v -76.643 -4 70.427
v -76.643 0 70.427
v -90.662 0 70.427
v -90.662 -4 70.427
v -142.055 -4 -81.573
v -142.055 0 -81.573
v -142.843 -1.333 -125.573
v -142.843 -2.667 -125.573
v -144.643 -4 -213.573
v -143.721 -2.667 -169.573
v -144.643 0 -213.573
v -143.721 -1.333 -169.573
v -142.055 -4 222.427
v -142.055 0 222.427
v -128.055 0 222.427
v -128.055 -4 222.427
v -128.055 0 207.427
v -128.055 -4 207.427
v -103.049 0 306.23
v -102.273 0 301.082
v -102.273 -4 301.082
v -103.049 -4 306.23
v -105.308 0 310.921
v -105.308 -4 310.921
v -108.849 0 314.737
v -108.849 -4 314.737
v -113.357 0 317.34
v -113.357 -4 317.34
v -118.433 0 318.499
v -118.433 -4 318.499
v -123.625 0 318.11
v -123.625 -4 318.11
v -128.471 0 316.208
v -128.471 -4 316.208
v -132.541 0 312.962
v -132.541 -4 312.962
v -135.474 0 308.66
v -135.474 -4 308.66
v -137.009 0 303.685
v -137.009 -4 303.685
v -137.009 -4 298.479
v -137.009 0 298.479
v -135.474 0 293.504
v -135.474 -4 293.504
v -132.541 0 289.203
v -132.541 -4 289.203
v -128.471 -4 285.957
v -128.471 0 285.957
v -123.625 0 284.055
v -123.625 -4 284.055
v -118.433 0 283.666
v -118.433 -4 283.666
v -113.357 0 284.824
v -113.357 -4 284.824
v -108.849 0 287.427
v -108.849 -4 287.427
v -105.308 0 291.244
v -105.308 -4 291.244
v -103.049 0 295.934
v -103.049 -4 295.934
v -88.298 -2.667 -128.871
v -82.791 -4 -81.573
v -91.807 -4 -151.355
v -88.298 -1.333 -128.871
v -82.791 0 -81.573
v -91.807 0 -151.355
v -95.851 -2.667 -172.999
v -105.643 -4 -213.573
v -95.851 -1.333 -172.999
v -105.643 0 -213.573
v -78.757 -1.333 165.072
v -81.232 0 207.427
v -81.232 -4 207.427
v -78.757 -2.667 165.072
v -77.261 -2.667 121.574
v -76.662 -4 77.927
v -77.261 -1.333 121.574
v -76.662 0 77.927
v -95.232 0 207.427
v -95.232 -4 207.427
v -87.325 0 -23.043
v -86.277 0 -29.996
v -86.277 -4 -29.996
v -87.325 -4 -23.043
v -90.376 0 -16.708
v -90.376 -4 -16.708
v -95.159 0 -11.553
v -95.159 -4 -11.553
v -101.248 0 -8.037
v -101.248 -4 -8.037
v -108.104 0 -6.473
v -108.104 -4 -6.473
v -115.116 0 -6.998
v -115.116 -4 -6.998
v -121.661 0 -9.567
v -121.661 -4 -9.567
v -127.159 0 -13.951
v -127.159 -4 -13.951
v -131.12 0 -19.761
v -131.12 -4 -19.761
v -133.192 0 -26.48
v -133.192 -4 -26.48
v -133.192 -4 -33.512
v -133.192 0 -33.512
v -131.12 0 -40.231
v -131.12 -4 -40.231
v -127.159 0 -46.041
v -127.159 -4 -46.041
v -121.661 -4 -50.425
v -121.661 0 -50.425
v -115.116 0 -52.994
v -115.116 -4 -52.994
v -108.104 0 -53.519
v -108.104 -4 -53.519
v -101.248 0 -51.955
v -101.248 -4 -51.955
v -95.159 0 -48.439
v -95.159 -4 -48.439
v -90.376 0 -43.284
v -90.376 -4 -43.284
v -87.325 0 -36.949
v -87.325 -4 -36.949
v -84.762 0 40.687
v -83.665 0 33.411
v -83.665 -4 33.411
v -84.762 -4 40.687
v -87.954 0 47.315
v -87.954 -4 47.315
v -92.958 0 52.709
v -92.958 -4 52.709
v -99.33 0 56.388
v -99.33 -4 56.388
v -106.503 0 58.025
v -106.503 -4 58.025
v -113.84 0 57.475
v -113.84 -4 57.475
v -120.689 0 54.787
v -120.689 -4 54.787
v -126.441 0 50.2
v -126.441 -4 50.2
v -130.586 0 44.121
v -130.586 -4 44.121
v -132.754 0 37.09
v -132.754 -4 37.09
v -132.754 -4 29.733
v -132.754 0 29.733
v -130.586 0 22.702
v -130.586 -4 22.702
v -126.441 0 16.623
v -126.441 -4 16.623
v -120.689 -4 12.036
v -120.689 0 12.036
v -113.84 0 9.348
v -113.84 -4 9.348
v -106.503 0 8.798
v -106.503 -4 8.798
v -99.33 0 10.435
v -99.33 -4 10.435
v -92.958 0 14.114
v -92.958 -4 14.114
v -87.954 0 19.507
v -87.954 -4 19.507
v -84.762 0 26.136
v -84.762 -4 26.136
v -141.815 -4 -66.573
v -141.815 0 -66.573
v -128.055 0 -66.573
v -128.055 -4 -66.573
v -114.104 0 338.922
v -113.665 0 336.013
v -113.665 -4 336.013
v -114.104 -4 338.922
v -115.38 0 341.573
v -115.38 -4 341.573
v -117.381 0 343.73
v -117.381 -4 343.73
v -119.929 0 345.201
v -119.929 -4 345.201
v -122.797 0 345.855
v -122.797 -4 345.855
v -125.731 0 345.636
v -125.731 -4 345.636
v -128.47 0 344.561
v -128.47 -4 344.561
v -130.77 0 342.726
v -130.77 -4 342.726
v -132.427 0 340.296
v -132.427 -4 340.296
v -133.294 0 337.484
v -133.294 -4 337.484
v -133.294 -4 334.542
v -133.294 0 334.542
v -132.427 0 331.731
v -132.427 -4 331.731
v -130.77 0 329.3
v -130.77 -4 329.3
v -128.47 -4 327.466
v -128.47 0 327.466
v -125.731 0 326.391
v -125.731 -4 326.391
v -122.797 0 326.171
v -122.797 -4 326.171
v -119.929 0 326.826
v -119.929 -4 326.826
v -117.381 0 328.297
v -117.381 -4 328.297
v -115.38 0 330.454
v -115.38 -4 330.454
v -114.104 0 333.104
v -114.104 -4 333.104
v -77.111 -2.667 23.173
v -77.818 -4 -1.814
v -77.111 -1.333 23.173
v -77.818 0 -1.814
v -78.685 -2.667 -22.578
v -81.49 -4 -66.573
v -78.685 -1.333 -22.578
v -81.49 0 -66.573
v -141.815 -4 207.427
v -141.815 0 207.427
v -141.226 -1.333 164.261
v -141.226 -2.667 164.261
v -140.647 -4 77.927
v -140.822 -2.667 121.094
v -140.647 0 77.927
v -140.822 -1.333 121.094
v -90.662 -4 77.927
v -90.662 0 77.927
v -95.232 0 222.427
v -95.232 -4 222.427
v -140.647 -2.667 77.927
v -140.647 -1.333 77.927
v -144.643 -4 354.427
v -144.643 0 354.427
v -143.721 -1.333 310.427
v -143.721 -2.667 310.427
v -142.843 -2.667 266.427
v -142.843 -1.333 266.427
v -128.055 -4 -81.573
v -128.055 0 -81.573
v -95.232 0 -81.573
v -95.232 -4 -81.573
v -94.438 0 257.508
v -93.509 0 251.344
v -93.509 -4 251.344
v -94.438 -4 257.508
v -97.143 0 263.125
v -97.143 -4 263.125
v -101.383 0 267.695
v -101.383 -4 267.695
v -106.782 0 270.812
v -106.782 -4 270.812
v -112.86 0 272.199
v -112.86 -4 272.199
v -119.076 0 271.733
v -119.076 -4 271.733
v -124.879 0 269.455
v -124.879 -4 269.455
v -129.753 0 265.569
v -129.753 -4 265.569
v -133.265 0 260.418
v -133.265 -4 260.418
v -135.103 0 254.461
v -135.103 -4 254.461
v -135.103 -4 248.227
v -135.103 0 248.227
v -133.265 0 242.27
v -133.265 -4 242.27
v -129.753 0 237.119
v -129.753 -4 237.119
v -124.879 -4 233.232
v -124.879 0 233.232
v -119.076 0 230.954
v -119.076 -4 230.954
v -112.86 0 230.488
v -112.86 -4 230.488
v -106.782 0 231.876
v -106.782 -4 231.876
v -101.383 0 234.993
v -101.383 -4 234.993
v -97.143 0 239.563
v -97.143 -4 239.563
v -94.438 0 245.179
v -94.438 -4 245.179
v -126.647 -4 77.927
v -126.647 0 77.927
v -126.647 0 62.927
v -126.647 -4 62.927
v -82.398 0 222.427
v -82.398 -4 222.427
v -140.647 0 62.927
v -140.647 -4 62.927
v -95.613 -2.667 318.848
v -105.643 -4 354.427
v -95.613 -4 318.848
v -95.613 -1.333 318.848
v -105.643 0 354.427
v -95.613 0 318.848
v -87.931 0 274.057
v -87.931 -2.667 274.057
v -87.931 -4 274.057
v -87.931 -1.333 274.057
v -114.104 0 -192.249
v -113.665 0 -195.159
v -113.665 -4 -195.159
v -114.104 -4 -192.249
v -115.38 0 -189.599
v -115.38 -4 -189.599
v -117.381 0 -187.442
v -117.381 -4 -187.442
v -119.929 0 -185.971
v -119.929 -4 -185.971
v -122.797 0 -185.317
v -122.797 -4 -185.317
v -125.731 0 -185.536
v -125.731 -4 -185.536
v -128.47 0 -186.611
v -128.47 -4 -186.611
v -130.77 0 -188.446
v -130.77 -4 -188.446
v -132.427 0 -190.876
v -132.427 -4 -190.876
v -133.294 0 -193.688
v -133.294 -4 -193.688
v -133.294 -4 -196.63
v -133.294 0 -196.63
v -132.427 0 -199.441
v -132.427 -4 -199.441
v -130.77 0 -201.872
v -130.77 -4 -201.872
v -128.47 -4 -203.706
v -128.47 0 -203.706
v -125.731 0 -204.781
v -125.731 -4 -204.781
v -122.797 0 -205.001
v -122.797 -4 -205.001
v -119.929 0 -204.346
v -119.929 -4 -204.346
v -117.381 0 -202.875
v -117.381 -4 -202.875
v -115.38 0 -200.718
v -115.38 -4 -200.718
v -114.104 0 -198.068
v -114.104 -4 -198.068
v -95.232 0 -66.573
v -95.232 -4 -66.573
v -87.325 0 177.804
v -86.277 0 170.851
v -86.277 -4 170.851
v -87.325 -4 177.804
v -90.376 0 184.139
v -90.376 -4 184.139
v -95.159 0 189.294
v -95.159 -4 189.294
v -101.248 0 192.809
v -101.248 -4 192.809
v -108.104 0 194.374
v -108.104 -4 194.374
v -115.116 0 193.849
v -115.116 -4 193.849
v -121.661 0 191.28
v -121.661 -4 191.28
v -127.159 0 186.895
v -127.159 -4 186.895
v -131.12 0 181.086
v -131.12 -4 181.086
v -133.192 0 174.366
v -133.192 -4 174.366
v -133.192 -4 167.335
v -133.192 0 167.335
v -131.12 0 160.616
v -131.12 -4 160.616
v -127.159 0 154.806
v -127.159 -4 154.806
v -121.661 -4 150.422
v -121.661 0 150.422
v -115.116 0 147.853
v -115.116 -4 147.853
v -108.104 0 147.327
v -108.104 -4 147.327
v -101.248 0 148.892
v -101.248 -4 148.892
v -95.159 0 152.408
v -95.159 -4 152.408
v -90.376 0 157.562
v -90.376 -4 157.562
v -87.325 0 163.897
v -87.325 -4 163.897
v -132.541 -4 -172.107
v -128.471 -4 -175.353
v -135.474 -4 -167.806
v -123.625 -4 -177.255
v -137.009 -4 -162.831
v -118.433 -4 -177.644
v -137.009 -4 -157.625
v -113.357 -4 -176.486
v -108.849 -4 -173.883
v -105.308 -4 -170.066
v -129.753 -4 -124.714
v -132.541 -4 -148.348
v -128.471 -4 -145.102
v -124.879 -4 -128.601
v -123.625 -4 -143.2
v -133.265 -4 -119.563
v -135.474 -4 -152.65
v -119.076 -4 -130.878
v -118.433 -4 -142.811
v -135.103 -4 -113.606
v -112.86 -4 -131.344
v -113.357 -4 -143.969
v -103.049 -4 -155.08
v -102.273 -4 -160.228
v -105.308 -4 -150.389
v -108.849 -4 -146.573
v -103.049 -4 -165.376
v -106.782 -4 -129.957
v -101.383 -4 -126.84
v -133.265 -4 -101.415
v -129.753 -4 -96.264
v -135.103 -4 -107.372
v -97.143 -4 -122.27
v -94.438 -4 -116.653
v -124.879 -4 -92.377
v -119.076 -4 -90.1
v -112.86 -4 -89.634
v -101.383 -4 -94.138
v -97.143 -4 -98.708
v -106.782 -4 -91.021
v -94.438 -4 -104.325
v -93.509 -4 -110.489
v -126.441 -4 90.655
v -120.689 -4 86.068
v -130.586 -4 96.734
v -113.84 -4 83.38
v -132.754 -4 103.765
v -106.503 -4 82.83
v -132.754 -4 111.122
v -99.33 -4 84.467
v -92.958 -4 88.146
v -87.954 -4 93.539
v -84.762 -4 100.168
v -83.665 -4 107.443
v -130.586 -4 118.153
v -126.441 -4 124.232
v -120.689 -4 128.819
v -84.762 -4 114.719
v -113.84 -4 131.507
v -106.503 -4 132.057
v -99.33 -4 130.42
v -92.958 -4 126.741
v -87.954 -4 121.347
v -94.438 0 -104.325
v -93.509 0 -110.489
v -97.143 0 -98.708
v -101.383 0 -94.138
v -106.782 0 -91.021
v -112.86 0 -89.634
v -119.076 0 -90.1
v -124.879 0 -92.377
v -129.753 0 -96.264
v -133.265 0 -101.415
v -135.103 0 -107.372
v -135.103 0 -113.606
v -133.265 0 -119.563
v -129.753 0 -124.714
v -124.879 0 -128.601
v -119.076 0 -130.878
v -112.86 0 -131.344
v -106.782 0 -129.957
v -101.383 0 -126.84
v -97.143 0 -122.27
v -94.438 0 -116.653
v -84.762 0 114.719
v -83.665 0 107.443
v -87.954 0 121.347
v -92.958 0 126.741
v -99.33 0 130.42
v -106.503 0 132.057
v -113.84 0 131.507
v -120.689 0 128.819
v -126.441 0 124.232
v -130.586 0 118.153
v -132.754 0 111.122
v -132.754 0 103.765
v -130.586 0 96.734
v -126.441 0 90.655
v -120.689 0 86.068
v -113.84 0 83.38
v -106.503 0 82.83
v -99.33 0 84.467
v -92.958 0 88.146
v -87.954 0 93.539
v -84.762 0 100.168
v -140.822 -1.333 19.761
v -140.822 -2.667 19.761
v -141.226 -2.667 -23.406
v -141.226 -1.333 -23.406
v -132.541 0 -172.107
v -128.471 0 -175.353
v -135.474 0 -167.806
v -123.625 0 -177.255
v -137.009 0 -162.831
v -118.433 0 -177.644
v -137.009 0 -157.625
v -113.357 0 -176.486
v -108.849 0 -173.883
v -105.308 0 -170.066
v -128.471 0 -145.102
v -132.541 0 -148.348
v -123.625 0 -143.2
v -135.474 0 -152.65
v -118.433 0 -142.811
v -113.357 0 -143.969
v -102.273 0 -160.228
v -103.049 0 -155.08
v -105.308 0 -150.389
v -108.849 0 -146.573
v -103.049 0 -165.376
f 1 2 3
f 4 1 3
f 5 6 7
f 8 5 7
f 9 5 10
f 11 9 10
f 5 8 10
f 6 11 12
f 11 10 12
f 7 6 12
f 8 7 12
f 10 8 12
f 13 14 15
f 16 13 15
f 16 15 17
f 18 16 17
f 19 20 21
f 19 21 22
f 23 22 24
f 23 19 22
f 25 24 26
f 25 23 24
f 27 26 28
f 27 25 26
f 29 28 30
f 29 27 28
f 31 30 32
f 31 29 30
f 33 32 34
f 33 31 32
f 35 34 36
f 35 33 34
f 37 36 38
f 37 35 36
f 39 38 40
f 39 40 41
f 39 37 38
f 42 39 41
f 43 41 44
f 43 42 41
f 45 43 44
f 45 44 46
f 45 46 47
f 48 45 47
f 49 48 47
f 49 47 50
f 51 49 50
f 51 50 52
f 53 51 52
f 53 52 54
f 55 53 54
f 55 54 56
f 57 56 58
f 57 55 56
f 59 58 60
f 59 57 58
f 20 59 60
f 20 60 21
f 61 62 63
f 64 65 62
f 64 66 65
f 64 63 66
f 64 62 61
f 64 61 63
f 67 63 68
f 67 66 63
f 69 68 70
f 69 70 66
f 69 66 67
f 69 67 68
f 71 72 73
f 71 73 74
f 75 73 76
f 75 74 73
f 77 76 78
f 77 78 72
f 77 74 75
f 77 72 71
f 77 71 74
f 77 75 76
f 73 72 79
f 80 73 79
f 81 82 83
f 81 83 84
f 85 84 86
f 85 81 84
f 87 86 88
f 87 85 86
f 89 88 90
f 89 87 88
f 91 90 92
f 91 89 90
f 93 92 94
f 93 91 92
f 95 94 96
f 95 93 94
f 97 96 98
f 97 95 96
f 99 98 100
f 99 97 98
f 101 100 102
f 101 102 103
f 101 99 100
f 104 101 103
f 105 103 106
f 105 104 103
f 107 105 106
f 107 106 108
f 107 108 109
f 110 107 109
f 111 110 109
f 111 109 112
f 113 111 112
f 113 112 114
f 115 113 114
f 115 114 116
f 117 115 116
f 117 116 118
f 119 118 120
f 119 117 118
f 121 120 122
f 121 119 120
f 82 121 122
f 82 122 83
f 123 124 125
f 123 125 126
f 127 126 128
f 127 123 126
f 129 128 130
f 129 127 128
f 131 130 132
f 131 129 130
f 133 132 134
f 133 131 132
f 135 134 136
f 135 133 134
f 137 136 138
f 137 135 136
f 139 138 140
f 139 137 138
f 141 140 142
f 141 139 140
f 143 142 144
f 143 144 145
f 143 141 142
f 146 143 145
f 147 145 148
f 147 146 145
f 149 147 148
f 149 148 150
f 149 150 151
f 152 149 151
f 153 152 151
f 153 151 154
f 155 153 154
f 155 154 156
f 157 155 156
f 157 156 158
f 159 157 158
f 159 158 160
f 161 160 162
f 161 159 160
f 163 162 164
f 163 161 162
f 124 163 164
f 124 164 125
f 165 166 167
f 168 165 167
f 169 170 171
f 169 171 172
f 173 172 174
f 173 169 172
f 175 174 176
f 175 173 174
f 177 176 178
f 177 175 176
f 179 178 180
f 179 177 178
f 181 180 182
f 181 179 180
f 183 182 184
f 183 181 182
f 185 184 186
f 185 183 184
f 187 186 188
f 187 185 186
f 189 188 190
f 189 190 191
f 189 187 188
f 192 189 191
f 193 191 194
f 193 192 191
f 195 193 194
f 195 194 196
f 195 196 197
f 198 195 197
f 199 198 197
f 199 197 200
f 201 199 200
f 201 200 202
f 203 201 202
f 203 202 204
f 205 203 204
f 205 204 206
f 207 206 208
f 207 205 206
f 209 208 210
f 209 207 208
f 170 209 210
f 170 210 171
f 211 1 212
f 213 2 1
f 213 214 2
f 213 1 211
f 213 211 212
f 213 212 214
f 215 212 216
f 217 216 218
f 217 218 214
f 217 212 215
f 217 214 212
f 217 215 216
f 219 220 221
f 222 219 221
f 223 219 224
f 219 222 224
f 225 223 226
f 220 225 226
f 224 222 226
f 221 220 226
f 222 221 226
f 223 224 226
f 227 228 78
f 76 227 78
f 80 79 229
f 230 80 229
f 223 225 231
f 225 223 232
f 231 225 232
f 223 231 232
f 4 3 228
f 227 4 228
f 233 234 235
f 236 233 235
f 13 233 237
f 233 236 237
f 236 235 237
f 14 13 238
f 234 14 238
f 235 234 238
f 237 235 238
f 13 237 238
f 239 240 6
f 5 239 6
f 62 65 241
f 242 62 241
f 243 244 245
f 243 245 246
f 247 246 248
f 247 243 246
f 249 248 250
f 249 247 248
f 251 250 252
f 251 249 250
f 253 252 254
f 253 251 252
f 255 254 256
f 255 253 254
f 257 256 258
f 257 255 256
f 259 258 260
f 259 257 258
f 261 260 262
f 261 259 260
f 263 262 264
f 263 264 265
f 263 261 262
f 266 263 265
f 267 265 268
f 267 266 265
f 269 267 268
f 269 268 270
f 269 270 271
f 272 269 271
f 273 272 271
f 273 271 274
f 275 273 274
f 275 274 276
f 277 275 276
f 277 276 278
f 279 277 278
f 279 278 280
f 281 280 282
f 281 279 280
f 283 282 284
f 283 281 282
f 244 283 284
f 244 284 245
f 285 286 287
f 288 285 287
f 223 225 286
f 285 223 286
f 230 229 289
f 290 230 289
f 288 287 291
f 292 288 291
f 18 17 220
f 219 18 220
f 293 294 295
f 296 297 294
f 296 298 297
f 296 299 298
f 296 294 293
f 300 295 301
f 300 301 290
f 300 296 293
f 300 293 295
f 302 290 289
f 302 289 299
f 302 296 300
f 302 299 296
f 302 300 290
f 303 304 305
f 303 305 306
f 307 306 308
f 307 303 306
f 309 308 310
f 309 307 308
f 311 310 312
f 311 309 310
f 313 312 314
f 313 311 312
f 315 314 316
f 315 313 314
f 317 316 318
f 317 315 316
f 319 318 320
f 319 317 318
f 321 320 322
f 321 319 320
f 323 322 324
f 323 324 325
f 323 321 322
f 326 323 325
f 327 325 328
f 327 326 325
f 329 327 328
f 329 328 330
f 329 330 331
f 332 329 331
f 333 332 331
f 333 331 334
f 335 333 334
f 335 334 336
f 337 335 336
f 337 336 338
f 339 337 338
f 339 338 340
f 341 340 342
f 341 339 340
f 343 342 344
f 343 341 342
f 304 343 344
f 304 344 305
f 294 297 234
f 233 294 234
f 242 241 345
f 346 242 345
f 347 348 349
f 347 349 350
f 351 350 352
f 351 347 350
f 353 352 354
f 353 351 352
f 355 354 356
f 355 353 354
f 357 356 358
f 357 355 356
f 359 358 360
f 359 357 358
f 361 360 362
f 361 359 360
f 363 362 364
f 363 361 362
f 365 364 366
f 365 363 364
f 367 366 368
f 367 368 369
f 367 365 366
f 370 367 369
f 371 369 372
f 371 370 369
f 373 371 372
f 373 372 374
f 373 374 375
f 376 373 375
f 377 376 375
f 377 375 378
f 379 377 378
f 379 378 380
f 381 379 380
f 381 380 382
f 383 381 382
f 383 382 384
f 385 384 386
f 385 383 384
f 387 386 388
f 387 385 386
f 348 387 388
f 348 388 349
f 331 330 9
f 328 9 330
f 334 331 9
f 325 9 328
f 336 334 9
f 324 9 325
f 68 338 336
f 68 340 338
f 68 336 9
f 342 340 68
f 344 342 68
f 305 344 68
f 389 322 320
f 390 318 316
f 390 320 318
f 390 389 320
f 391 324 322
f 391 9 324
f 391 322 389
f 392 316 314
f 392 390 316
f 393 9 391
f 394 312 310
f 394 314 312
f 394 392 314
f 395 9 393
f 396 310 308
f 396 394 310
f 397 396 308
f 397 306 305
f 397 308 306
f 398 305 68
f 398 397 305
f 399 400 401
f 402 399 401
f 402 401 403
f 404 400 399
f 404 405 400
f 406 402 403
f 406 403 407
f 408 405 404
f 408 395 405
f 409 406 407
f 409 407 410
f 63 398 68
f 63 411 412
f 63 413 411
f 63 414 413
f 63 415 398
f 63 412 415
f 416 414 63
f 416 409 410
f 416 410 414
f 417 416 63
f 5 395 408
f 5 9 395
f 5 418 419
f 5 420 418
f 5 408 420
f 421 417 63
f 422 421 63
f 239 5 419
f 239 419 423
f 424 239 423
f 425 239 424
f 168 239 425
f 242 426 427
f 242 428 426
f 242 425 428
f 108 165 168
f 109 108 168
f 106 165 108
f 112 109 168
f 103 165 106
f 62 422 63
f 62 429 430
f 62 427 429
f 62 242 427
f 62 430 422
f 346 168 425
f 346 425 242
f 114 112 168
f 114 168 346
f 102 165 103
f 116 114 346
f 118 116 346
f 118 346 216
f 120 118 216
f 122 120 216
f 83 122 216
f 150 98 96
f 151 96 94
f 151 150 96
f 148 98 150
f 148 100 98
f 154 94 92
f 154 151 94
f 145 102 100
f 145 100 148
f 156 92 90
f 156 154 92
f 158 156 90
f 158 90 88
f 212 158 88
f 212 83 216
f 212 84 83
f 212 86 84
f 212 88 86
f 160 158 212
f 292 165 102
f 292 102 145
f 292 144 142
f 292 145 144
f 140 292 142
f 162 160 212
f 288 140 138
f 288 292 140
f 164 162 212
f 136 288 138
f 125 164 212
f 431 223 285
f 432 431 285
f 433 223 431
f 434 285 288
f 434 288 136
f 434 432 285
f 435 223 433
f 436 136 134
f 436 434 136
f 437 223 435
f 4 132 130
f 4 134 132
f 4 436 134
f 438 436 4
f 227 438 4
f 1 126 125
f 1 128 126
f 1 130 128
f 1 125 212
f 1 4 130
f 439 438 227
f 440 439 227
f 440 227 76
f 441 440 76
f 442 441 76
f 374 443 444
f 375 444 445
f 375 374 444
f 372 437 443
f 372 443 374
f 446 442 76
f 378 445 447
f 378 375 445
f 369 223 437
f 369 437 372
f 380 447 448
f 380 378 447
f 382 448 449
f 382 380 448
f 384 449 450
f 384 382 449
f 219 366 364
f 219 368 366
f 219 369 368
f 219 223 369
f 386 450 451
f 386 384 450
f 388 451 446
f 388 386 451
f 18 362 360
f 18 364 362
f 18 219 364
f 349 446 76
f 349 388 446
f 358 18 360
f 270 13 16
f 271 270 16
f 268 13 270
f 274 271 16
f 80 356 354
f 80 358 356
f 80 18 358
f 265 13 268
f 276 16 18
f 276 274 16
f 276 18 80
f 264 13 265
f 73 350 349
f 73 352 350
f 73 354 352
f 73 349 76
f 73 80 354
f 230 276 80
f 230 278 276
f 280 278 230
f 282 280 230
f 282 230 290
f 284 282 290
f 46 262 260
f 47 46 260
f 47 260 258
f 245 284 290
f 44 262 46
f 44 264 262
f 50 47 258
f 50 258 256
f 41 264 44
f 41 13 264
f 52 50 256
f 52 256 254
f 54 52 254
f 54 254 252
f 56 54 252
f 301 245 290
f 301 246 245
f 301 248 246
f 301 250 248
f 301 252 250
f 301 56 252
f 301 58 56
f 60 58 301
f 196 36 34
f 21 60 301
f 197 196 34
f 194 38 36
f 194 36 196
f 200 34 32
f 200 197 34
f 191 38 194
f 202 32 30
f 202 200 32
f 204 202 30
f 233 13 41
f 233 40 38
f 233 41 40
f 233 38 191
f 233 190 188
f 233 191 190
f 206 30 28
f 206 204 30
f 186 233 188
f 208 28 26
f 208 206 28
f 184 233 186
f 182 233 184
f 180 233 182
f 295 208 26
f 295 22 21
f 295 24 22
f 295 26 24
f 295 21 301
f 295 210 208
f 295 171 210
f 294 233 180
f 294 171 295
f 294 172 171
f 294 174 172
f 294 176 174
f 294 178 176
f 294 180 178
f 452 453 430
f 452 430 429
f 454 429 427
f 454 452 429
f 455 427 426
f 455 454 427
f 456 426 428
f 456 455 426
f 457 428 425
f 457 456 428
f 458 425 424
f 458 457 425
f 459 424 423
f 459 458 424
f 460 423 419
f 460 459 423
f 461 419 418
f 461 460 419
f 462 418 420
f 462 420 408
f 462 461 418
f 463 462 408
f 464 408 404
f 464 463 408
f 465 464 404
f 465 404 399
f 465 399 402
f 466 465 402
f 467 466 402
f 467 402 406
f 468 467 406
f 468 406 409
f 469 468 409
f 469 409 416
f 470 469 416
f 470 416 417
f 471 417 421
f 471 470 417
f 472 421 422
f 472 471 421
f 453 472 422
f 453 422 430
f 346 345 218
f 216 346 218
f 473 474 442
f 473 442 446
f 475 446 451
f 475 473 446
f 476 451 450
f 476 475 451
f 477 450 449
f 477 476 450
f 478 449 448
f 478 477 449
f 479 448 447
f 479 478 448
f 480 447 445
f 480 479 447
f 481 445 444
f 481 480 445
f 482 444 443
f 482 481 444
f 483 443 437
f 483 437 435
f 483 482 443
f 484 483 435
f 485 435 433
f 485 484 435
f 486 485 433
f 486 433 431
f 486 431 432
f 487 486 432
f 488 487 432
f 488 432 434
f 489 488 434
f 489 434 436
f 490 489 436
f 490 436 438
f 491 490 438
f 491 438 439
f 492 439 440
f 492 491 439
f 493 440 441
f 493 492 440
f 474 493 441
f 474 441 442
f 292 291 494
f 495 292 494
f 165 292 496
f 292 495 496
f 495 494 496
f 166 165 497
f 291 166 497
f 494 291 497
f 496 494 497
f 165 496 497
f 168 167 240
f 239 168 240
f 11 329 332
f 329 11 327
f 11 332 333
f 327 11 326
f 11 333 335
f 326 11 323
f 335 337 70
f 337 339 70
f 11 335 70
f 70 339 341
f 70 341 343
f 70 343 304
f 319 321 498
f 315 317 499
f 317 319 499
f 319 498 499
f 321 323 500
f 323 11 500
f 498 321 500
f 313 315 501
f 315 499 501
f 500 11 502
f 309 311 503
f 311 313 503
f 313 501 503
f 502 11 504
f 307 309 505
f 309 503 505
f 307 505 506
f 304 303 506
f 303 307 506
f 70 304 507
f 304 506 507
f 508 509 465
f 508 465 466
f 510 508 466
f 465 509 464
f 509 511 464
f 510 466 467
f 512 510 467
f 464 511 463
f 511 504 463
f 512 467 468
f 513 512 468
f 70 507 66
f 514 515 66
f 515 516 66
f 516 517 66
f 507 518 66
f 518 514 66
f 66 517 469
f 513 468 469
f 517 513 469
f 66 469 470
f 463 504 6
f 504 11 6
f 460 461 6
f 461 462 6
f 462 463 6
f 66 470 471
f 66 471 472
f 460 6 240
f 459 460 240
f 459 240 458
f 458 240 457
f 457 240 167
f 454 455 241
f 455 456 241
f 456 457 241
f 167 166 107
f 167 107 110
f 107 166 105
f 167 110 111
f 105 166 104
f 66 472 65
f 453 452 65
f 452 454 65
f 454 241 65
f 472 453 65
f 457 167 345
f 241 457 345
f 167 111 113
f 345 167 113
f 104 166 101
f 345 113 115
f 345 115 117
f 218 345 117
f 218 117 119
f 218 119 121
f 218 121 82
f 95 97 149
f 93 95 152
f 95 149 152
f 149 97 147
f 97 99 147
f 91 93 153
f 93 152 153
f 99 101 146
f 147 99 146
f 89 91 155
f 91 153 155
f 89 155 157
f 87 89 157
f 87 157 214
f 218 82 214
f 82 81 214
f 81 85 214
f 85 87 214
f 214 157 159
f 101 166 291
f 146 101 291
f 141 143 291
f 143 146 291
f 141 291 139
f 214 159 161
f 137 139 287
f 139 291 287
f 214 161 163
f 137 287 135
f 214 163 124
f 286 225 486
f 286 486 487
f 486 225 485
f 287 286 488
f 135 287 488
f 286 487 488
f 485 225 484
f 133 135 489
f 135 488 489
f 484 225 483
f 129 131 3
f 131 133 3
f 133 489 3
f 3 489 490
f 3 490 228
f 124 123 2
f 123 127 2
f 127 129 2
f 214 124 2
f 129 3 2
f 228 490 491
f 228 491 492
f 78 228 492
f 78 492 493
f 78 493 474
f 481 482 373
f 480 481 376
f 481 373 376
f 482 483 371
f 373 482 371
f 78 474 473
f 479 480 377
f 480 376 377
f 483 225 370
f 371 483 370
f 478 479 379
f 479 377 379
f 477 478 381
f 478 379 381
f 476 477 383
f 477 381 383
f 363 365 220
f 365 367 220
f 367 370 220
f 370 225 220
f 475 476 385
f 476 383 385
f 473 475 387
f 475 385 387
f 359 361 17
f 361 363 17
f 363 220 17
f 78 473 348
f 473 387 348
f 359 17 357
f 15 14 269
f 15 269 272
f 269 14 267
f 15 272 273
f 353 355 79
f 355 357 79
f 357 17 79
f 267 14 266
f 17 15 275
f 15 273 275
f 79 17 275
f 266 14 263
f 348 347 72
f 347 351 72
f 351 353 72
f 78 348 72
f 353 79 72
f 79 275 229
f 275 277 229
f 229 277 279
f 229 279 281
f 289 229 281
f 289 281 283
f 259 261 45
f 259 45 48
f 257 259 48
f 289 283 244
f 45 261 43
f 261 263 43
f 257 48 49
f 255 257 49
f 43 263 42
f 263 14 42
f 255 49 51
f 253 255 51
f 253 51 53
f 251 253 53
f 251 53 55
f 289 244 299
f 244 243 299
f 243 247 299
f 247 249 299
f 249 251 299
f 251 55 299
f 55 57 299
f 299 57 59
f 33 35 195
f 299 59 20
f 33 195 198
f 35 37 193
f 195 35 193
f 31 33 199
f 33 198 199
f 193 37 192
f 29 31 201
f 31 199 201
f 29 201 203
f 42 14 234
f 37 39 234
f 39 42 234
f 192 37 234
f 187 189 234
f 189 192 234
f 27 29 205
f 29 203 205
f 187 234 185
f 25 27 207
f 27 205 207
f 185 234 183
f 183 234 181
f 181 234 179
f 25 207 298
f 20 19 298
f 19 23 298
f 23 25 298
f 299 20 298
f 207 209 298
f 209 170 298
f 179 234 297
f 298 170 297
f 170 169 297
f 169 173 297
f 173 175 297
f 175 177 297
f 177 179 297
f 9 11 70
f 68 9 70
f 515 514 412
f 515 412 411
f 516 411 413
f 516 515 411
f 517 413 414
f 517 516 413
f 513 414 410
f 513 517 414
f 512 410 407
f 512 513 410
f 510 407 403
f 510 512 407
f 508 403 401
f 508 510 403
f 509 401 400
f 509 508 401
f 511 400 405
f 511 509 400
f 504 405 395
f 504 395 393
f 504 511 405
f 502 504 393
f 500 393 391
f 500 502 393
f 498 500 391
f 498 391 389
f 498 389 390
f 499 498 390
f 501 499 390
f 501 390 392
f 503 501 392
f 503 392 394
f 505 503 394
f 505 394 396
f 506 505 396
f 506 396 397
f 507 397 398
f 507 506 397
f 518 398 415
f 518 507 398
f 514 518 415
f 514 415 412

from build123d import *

# Parameters (mm, degrees)
F0_R     = 20.913693
F0_R_2   = 17.465472
F0_R_3   = 9.869676
F0_R_4   = 24.682403
F0_R_5   = 23.589378
F1_DEPTH = 4


with BuildPart() as f1:
    # F0 (on Front) → F1 (new body)
    with BuildSketch(Plane.XZ):
        with BuildLine():
            Line((-105.642843, 354.427334), (-144.642843, 354.427334))
            add(Edge.make_bspline(
                [(-144.642843, 354.427334), (-143.713265, 310.427334), (-142.783688, 266.427334), (-142.054926, 222.427334)],
                knots=[0, 0, 0, 0, 132.013092, 132.013092, 132.013092, 132.013092], degree=3))
            Line((-142.054926, 222.427334), (-128.054926, 222.427334))
            Line((-128.054926, 222.427334), (-128.054926, 214.927334))
            Line((-128.054926, 214.927334), (-95.232242, 214.927334))
            Line((-95.232242, 214.927334), (-95.232242, 222.427334))
            Line((-95.232242, 222.427334), (-82.397624, 222.427334))
            add(Edge.make_bspline(
                [(-105.642843, 354.427334), (-94.373968, 324.244912), (-86.922567, 276.685565), (-82.397624, 222.427334)],
                knots=[0, 0, 0, 0, 151.629613, 151.629613, 151.629613, 151.629613], degree=3))
        make_face()
        with Locations((-114.42259, 251.343668)):
            Circle(F0_R, mode=Mode.SUBTRACT)
        with Locations((-119.738169, 301.082313)):
            Circle(F0_R_2, mode=Mode.SUBTRACT)
        with Locations((-123.535015, 336.013287)):
            Circle(F0_R_3, mode=Mode.SUBTRACT)
        with BuildLine():
            Line((-128.054926, 207.427334), (-141.814558, 207.427334))
            add(Edge.make_bspline(
                [(-141.814558, 207.427334), (-141.146919, 164.260708), (-140.694523, 121.094083), (-140.646991, 77.927458)],
                knots=[147.01458, 147.01458, 147.01458, 147.01458, 276.5273, 276.5273, 276.5273, 276.5273], degree=3))
            add(Edge.make_bspline(
                [(-140.646991, 77.927458), (-140.646991, 77.927416), (-140.646991, 77.927375), (-140.646991, 77.927334)],
                knots=[276.5273, 276.5273, 276.5273, 276.5273, 276.527424, 276.527424, 276.527424, 276.527424], degree=3))
            Line((-140.646991, 77.927334), (-126.646991, 77.927334))
            Line((-126.646991, 77.927334), (-126.646991, 70.427334))
            Line((-126.646991, 70.427334), (-90.667988, 70.427334))
            Line((-90.667988, 70.427334), (-90.661724, 70.427334))
            Line((-90.661724, 70.427334), (-90.661724, 77.927334))
            Line((-90.661724, 77.927334), (-76.661724, 77.927334))
            add(Edge.make_bspline(
                [(-81.232242, 207.427334), (-78.239795, 165.975298), (-76.840765, 121.316902), (-76.661724, 77.927334)],
                knots=[165.454488, 165.454488, 165.454488, 165.454488, 278.926983, 278.926983, 278.926983, 278.926983], degree=3))
            Line((-81.232242, 207.427334), (-95.232242, 207.427334))
            Line((-95.232242, 207.427334), (-95.232242, 214.927334))
            Line((-95.232242, 214.927334), (-128.054926, 214.927334))
            Line((-128.054926, 214.927334), (-128.054926, 207.427334))
        make_face()
        with Locations((-108.347639, 107.443303)):
            Circle(F0_R_4, mode=Mode.SUBTRACT)
        with Locations((-109.866373, 170.85059)):
            Circle(F0_R_5, mode=Mode.SUBTRACT)
        with BuildLine():
            add(Edge.make_bspline(
                [(-142.054926, -81.572666), (-142.783688, -125.572666), (-143.713265, -169.572666), (-144.642843, -213.572666)],
                knots=[436.043243, 436.043243, 436.043243, 436.043243, 568.056335, 568.056335, 568.056335, 568.056335], degree=3))
            Line((-144.642843, -213.572666), (-105.642843, -213.572666))
            add(Edge.make_bspline(
                [(-82.791095, -81.572666), (-87.337348, -130.326688), (-94.669187, -174.905471), (-105.642843, -213.572666)],
                knots=[426.00823, 426.00823, 426.00823, 426.00823, 570.953588, 570.953588, 570.953588, 570.953588], degree=3))
            Line((-82.791095, -81.572666), (-95.232242, -81.572666))
            Line((-95.232242, -81.572666), (-95.232242, -74.072666))
            Line((-95.232242, -74.072666), (-95.232242, -66.572666))
            Line((-95.232242, -66.572666), (-81.489773, -66.572666))
            add(Edge.make_bspline(
                [(-76.642843, 70.427334), (-76.599115, 22.505564), (-78.028195, -23.539434), (-81.489773, -66.572666)],
                knots=[285.476794, 285.476794, 285.476794, 285.476794, 411.269799, 411.269799, 411.269799, 411.269799], degree=3))
            Line((-76.642843, 70.427334), (-90.661724, 70.427334))
            Line((-90.661724, 70.427334), (-90.667988, 70.427334))
            Line((-90.667988, 70.427334), (-126.646991, 70.427334))
            Line((-126.646991, 70.427334), (-126.646991, 62.927334))
            Line((-126.646991, 62.927334), (-140.646991, 62.927334))
            add(Edge.make_bspline(
                [(-140.646991, 62.927334), (-140.694522, 19.760667), (-141.146918, -23.405999), (-141.814558, -66.572666)],
                knots=[291.528911, 291.528911, 291.528911, 291.528911, 421.041756, 421.041756, 421.041756, 421.041756], degree=3))
            Line((-141.814558, -66.572666), (-128.054926, -66.572666))
            Line((-128.054926, -66.572666), (-128.054926, -74.072666))
            Line((-128.054926, -74.072666), (-128.054926, -81.572666))
            Line((-128.054926, -81.572666), (-142.054926, -81.572666))
        make_face()
        with Locations((-123.535015, -195.158619)):
            Circle(F0_R_3, mode=Mode.SUBTRACT)
        with Locations((-119.738169, -160.227645)):
            Circle(F0_R_2, mode=Mode.SUBTRACT)
        with Locations((-114.42259, -110.489)):
            Circle(F0_R, mode=Mode.SUBTRACT)
        with Locations((-109.866373, -29.995922)):
            Circle(F0_R_5, mode=Mode.SUBTRACT)
        with Locations((-108.347639, 33.411365)):
            Circle(F0_R_4, mode=Mode.SUBTRACT)
    extrude(amount=F1_DEPTH)


solid = f1.part
